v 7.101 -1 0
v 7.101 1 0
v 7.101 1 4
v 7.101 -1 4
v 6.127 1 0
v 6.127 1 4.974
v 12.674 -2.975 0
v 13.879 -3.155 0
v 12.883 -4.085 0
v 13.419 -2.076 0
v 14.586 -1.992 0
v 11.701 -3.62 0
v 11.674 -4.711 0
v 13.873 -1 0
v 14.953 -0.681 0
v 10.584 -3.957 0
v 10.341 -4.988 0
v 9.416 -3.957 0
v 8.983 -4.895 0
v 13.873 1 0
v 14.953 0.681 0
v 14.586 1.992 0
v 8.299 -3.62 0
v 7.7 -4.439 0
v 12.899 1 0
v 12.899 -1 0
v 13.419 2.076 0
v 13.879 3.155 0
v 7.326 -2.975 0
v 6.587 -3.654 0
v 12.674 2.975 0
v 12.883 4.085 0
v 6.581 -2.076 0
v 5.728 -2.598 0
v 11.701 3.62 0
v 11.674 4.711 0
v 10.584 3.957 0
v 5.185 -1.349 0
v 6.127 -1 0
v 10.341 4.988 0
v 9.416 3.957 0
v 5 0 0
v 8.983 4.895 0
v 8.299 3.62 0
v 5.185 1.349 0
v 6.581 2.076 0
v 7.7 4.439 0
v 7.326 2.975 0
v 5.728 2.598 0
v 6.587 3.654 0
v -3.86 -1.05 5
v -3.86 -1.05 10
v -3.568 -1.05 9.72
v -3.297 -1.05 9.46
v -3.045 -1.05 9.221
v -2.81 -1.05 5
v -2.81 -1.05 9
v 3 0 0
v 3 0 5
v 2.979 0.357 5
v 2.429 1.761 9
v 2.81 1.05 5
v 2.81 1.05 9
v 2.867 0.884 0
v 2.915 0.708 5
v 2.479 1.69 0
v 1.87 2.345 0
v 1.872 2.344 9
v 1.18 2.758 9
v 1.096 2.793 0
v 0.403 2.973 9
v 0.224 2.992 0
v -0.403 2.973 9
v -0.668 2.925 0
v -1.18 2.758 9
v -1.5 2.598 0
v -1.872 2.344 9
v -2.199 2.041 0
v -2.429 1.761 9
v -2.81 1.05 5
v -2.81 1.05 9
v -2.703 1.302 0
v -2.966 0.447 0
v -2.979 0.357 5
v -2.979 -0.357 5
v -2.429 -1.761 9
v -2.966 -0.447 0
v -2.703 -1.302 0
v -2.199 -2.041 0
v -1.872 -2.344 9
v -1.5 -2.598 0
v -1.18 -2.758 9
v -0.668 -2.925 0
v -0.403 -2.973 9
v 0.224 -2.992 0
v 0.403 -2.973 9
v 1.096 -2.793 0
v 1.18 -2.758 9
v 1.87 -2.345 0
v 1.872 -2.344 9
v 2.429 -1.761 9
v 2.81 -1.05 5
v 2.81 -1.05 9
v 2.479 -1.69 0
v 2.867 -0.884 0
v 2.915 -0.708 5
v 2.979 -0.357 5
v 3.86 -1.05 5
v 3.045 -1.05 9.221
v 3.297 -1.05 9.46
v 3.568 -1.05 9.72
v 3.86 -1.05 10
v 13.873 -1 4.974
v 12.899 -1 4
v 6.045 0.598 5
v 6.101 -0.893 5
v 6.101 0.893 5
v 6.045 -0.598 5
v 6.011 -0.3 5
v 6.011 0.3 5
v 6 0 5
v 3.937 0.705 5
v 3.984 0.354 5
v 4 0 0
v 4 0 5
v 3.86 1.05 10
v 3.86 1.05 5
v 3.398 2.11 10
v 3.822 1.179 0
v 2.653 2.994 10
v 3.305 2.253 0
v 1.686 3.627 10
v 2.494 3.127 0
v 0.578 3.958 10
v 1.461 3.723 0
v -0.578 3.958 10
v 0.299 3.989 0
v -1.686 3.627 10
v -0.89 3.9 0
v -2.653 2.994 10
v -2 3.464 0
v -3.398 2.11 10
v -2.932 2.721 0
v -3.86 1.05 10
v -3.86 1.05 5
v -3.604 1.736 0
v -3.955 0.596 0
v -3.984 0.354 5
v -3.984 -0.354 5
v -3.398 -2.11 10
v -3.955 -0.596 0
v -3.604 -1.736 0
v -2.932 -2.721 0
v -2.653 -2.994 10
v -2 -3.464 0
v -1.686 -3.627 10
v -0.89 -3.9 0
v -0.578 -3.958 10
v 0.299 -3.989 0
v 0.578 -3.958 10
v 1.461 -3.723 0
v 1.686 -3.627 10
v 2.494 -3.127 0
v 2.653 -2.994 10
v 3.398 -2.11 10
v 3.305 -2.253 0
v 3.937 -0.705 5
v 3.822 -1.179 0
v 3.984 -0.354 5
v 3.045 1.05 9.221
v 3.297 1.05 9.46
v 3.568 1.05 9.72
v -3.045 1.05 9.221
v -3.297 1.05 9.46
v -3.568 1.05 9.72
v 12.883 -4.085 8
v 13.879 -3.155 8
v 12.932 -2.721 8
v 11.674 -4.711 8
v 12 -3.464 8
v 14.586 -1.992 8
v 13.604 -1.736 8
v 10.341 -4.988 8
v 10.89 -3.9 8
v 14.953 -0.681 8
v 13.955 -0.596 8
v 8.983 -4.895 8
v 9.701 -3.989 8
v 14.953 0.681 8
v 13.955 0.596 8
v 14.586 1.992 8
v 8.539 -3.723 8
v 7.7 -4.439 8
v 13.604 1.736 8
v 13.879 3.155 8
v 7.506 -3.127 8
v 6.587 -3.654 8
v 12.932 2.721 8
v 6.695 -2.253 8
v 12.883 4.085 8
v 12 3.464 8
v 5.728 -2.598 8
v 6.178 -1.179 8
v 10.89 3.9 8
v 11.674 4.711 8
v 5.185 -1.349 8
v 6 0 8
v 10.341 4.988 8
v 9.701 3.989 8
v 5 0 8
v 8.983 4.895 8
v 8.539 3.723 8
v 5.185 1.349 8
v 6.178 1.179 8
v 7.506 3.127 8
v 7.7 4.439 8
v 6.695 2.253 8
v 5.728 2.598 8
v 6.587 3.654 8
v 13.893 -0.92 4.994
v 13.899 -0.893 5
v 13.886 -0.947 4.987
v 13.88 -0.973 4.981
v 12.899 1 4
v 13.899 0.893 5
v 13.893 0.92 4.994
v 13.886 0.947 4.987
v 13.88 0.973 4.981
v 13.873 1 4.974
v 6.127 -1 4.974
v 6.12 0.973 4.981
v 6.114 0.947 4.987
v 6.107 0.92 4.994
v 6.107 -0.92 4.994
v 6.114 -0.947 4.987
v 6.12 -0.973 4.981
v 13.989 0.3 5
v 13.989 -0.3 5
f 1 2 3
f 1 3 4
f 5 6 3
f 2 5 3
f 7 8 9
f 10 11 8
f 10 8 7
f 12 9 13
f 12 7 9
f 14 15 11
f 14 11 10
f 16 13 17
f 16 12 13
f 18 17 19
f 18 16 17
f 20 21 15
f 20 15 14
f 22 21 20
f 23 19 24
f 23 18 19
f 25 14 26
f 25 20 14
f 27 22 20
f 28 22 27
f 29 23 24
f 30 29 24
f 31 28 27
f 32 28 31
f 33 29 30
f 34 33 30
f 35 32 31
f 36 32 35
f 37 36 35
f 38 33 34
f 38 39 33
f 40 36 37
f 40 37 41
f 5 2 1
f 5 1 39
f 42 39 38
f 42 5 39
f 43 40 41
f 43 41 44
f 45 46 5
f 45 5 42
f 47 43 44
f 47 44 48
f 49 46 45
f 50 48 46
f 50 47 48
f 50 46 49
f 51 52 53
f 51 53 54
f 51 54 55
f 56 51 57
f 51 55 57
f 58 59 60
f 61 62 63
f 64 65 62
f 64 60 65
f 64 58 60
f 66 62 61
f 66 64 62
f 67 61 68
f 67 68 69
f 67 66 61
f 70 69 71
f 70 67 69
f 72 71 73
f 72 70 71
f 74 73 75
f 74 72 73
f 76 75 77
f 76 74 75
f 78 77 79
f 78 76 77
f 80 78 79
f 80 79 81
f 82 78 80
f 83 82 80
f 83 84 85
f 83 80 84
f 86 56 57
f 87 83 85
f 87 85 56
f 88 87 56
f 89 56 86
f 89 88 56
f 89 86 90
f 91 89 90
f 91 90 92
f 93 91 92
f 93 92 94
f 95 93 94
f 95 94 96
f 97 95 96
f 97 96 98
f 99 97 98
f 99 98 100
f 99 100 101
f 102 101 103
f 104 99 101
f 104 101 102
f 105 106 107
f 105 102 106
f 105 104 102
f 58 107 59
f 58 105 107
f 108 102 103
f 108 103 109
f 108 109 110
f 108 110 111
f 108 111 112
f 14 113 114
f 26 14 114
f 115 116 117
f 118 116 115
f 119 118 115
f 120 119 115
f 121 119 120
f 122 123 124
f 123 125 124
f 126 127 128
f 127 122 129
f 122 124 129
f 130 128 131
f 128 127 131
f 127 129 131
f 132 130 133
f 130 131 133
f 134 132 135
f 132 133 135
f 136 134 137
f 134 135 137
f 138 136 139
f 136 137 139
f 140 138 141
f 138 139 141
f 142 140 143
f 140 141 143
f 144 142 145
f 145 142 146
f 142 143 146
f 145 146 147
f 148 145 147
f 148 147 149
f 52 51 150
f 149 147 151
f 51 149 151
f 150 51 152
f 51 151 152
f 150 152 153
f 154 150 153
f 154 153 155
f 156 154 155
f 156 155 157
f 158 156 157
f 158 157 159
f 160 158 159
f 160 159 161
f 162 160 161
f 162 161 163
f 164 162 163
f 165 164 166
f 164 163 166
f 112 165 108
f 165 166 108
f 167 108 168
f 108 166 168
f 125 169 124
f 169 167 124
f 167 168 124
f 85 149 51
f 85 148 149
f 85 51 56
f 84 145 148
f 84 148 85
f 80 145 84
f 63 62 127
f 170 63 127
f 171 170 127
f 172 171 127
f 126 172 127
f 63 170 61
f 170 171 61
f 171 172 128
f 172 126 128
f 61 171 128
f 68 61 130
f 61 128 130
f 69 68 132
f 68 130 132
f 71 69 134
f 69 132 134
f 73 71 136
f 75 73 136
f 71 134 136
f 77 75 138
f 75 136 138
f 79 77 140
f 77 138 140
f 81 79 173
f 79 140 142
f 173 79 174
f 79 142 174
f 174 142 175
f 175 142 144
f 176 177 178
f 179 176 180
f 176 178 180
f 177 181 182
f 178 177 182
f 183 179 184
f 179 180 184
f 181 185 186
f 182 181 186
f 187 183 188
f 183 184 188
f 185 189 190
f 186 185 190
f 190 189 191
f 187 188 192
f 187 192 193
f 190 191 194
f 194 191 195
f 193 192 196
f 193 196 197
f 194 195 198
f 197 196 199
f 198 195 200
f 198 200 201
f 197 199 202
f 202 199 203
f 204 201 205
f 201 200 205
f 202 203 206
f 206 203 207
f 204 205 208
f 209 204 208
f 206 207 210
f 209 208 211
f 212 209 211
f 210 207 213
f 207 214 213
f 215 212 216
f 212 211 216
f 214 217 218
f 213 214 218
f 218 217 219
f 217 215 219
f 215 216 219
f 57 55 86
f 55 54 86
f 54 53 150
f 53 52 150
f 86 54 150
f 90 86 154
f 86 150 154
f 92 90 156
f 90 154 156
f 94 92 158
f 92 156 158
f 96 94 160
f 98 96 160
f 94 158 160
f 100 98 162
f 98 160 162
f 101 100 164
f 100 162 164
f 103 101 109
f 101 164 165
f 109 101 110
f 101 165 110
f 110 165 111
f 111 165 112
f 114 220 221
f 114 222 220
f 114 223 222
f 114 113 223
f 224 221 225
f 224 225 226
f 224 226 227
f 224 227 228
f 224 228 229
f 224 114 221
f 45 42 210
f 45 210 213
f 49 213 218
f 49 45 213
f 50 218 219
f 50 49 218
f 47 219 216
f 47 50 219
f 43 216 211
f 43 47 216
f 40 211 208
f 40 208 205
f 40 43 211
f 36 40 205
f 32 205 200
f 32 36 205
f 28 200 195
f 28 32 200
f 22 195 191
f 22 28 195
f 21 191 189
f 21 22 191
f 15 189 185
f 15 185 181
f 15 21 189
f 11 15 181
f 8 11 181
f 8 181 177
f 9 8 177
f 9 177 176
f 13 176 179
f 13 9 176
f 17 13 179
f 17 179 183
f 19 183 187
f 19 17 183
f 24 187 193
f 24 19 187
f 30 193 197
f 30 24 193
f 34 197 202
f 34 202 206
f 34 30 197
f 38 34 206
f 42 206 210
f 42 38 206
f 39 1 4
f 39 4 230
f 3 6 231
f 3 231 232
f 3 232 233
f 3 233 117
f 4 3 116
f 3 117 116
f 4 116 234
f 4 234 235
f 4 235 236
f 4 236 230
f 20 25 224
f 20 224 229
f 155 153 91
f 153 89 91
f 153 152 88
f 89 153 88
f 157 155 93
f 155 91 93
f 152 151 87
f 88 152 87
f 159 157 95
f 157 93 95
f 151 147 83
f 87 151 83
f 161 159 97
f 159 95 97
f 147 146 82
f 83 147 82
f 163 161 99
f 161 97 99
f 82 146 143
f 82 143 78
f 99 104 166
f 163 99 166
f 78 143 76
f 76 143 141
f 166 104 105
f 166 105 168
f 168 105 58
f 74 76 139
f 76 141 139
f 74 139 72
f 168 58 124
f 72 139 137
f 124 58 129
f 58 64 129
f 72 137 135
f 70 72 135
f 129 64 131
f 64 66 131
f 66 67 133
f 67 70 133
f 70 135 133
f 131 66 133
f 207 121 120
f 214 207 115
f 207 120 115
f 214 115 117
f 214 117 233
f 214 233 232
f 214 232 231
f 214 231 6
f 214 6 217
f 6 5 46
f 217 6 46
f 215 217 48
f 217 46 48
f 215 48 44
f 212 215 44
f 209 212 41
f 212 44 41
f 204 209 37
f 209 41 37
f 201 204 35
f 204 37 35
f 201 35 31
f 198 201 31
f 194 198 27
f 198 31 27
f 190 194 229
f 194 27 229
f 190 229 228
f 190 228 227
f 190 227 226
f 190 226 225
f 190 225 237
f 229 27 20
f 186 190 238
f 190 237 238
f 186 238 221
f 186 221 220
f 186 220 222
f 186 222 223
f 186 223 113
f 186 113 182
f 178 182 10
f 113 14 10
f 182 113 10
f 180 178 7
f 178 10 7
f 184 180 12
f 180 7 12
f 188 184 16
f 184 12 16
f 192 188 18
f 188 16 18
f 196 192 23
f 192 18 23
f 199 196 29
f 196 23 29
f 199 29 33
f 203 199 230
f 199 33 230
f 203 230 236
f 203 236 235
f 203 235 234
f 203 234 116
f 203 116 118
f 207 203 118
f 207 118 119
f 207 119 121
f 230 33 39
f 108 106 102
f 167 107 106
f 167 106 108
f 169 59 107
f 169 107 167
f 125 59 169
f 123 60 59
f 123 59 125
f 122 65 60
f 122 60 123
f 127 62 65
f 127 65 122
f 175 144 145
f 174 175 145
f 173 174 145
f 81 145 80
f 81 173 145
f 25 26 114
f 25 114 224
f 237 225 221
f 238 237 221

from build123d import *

# Parameters (mm, degrees)
SKETCH1_R           = 4
SKETCH1_R_2         = 3
BOSS_EXTRUDE1_DEPTH = 10
SKETCH2_W           = 8
SKETCH2_H           = 2.1
CUT_EXTRUDE1_DEPTH  = 5
SKETCH3_R           = 5
SKETCH3_R_2         = 4
BOSS_EXTRUDE2_DEPTH = 8
BOSS_EXTRUDE3_DEPTH = 5
CHAMFER1_SIZE       = 1
CHAMFER2_SIZE       = 1


with BuildPart() as part:
    # Sketch1 → Boss-Extrude1 (new body)
    with BuildSketch(Plane.XY):
        Circle(SKETCH1_R)
        Circle(SKETCH1_R_2, mode=Mode.SUBTRACT)
    extrude(amount=BOSS_EXTRUDE1_DEPTH)

    # Sketch2 → Cut-Extrude1 (cut)
    with BuildSketch(Plane.XY.offset(10)):
        Rectangle(SKETCH2_W, SKETCH2_H)
    extrude(amount=-CUT_EXTRUDE1_DEPTH, mode=Mode.SUBTRACT)

    # Chamfer2
    chamfer2_edges = [part.edges().sort_by_distance(p)[0] for p in [
        (0, -3, 10),
        (0, 3, 10),
    ]]
    chamfer(chamfer2_edges, length=CHAMFER2_SIZE - 0.0001)  # a hair under: the kernel refuses the full size


with BuildPart() as body_2:
    # Sketch3 → Boss-Extrude2 (new body)
    with BuildSketch(Plane(origin=(0, 0, 0), x_dir=(-1, 0, 0), z_dir=(0, 0, -1))):
        with Locations((-10, 0)):
            Circle(SKETCH3_R)
        with Locations((-10, 0)):
            Circle(SKETCH3_R_2, mode=Mode.SUBTRACT)
    extrude(amount=-BOSS_EXTRUDE2_DEPTH)

    # Sketch4 → Boss-Extrude3 (add)
    with BuildSketch(Plane(origin=(0, 0, 0), x_dir=(-1, 0, 0), z_dir=(0, 0, -1))):
        with BuildLine():
            Line((-13.872983346, -1), (-12.898979486, -1))
            Line((-12.898979486, -1), (-12.898979486, 1))
            Line((-12.898979486, 1), (-13.872983346, 1))
            ThreePointArc((-13.872983346, 1), (-14, 0), (-13.872983346, -1))
        make_face()
        with BuildLine():
            Line((-7.101020514, 1), (-7.101020514, -1))
            Line((-7.101020514, -1), (-6.127016654, -1))
            ThreePointArc((-6.127016654, -1), (-6.031881215, -0.50401717), (-6, 0))
            ThreePointArc((-6, 0), (-6.031881215, 0.50401717), (-6.127016654, 1))
            Line((-6.127016654, 1), (-7.101020514, 1))
        make_face()
    extrude(amount=-BOSS_EXTRUDE3_DEPTH)

    # Chamfer1
    chamfer1_edges = [body_2.edges().sort_by_distance(p)[0] for p in [
        (12.898979486, 0, 5),
        (7.101020514, 0, 5),
    ]]
    chamfer(chamfer1_edges, length=CHAMFER1_SIZE)


solid = Compound([part.part, body_2.part])
